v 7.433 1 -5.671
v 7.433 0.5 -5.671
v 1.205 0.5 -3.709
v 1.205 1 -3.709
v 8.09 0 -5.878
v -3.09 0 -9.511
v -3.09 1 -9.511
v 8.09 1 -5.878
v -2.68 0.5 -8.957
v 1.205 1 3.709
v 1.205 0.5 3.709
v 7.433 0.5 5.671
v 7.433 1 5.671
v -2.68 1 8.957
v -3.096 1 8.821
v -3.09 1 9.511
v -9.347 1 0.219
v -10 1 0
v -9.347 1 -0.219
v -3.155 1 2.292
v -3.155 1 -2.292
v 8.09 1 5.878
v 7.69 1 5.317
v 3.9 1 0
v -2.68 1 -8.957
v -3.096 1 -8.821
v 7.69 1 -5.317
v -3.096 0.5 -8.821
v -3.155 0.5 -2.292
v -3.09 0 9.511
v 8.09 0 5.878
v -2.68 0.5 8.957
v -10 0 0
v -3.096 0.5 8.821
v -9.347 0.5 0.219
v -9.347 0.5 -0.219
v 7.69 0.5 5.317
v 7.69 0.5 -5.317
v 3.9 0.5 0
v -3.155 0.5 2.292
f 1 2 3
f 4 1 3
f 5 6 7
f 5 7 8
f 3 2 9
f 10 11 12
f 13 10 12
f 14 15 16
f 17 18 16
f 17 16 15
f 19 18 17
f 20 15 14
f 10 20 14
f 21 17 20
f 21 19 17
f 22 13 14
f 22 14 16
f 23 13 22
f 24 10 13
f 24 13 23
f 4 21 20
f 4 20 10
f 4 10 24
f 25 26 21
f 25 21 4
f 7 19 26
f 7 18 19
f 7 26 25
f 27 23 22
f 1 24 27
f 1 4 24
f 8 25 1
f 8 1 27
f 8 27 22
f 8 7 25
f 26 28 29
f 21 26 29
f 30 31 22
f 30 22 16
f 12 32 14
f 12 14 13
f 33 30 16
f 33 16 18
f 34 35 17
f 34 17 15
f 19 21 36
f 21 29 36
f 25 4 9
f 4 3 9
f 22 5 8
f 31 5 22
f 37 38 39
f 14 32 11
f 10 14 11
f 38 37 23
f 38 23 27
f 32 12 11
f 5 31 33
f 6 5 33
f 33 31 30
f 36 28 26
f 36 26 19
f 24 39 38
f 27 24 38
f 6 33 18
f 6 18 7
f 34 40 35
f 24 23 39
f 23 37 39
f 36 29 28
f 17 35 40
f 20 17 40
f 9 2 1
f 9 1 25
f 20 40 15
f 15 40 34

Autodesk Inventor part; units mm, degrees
ref_plane "YZ Plane" through (0, 0, 0) normal (1, 0, 0) x (0, 1, 0)
ref_plane "XZ Plane" through (0, 0, 0) normal (0, 1, 0) x (-1, 0, 0)
ref_plane "XY Plane" through (0, 0, 0) normal (0, 0, 1) x (1, 0, 0)
sketch "Boceto1" plane through (0, 0, 0) normal (0, 1, 0) x (-1, 0, 0)
  circle A0 centre (0, 0) radius 10
  line L0 (10, 0) -> (3.0902, -9.5106)
  line L1 (3.0902, -9.5106) -> (-8.0902, -5.8779)
  line L2 (-8.0902, -5.8779) -> (-8.0902, 5.8779)
  line L3 (-8.0902, 5.8779) -> (3.0902, 9.5106)
  line L4 (3.0902, 9.5106) -> (10, 0)
  line L5 (-7.6902, -5.5872) -> (2.9374, -9.0403)
  line L6 (2.9374, -9.0403) -> (9.5056, 0)
  line L7 (9.5056, 0) -> (2.9374, 9.0403)
  line L8 (2.9374, 9.0403) -> (-7.6902, 5.5872)
  line L9 (-7.6902, 5.5872) -> (-7.6902, -5.5872)
  dimension "d0" = 20
  dimension "d1" = 0.4
extrude "Extrusión1" add sketch "Boceto1" along normal blind 1 contours L0 L1 L2 L3 L4
extrude "Extrusión2" add sketch "Boceto1" along normal blind 0.5 contours L9 L8 L7 L6 L5
sketch "Boceto2" plane through (0, 0.5, 0) normal (0, 1, 0) x (1, 0, 0)
  line L0 (8.0902, -5.8779) -> (8.0902, 5.8779) projected
  line L1 (8.0902, -5.8779) -> (3.9, 0)
  line L2 (3.9, 0) -> (8.0902, 5.8779)
  circle A0 centre (0, 0) radius 10 projected
  line L3 (8.0902, 5.8779) -> (1.2052, 3.7091)
  line L4 (1.2052, 3.7091) -> (-3.0902, 9.5106)
  line L5 (-3.0902, 9.5106) -> (-3.1552, 2.2924)
  line L6 (-3.1552, 2.2924) -> (-10, 0)
  line L7 (-10, 0) -> (-3.1552, -2.2924)
  line L8 (-3.1552, -2.2924) -> (-3.0902, -9.5106)
  line L9 (-3.0902, -9.5106) -> (1.2052, -3.7091)
  line L10 (1.2052, -3.7091) -> (8.0902, -5.8779)
  dimension "d6" = 3.9
  dimension "d9" = 360
extrude "Extrusión3" add sketch "Boceto2" along normal blind 0.5 contours L10 L9 L8 L7 L6 L5 L4 L3 L2 L1
properties part number "Pieza de practica 1"
